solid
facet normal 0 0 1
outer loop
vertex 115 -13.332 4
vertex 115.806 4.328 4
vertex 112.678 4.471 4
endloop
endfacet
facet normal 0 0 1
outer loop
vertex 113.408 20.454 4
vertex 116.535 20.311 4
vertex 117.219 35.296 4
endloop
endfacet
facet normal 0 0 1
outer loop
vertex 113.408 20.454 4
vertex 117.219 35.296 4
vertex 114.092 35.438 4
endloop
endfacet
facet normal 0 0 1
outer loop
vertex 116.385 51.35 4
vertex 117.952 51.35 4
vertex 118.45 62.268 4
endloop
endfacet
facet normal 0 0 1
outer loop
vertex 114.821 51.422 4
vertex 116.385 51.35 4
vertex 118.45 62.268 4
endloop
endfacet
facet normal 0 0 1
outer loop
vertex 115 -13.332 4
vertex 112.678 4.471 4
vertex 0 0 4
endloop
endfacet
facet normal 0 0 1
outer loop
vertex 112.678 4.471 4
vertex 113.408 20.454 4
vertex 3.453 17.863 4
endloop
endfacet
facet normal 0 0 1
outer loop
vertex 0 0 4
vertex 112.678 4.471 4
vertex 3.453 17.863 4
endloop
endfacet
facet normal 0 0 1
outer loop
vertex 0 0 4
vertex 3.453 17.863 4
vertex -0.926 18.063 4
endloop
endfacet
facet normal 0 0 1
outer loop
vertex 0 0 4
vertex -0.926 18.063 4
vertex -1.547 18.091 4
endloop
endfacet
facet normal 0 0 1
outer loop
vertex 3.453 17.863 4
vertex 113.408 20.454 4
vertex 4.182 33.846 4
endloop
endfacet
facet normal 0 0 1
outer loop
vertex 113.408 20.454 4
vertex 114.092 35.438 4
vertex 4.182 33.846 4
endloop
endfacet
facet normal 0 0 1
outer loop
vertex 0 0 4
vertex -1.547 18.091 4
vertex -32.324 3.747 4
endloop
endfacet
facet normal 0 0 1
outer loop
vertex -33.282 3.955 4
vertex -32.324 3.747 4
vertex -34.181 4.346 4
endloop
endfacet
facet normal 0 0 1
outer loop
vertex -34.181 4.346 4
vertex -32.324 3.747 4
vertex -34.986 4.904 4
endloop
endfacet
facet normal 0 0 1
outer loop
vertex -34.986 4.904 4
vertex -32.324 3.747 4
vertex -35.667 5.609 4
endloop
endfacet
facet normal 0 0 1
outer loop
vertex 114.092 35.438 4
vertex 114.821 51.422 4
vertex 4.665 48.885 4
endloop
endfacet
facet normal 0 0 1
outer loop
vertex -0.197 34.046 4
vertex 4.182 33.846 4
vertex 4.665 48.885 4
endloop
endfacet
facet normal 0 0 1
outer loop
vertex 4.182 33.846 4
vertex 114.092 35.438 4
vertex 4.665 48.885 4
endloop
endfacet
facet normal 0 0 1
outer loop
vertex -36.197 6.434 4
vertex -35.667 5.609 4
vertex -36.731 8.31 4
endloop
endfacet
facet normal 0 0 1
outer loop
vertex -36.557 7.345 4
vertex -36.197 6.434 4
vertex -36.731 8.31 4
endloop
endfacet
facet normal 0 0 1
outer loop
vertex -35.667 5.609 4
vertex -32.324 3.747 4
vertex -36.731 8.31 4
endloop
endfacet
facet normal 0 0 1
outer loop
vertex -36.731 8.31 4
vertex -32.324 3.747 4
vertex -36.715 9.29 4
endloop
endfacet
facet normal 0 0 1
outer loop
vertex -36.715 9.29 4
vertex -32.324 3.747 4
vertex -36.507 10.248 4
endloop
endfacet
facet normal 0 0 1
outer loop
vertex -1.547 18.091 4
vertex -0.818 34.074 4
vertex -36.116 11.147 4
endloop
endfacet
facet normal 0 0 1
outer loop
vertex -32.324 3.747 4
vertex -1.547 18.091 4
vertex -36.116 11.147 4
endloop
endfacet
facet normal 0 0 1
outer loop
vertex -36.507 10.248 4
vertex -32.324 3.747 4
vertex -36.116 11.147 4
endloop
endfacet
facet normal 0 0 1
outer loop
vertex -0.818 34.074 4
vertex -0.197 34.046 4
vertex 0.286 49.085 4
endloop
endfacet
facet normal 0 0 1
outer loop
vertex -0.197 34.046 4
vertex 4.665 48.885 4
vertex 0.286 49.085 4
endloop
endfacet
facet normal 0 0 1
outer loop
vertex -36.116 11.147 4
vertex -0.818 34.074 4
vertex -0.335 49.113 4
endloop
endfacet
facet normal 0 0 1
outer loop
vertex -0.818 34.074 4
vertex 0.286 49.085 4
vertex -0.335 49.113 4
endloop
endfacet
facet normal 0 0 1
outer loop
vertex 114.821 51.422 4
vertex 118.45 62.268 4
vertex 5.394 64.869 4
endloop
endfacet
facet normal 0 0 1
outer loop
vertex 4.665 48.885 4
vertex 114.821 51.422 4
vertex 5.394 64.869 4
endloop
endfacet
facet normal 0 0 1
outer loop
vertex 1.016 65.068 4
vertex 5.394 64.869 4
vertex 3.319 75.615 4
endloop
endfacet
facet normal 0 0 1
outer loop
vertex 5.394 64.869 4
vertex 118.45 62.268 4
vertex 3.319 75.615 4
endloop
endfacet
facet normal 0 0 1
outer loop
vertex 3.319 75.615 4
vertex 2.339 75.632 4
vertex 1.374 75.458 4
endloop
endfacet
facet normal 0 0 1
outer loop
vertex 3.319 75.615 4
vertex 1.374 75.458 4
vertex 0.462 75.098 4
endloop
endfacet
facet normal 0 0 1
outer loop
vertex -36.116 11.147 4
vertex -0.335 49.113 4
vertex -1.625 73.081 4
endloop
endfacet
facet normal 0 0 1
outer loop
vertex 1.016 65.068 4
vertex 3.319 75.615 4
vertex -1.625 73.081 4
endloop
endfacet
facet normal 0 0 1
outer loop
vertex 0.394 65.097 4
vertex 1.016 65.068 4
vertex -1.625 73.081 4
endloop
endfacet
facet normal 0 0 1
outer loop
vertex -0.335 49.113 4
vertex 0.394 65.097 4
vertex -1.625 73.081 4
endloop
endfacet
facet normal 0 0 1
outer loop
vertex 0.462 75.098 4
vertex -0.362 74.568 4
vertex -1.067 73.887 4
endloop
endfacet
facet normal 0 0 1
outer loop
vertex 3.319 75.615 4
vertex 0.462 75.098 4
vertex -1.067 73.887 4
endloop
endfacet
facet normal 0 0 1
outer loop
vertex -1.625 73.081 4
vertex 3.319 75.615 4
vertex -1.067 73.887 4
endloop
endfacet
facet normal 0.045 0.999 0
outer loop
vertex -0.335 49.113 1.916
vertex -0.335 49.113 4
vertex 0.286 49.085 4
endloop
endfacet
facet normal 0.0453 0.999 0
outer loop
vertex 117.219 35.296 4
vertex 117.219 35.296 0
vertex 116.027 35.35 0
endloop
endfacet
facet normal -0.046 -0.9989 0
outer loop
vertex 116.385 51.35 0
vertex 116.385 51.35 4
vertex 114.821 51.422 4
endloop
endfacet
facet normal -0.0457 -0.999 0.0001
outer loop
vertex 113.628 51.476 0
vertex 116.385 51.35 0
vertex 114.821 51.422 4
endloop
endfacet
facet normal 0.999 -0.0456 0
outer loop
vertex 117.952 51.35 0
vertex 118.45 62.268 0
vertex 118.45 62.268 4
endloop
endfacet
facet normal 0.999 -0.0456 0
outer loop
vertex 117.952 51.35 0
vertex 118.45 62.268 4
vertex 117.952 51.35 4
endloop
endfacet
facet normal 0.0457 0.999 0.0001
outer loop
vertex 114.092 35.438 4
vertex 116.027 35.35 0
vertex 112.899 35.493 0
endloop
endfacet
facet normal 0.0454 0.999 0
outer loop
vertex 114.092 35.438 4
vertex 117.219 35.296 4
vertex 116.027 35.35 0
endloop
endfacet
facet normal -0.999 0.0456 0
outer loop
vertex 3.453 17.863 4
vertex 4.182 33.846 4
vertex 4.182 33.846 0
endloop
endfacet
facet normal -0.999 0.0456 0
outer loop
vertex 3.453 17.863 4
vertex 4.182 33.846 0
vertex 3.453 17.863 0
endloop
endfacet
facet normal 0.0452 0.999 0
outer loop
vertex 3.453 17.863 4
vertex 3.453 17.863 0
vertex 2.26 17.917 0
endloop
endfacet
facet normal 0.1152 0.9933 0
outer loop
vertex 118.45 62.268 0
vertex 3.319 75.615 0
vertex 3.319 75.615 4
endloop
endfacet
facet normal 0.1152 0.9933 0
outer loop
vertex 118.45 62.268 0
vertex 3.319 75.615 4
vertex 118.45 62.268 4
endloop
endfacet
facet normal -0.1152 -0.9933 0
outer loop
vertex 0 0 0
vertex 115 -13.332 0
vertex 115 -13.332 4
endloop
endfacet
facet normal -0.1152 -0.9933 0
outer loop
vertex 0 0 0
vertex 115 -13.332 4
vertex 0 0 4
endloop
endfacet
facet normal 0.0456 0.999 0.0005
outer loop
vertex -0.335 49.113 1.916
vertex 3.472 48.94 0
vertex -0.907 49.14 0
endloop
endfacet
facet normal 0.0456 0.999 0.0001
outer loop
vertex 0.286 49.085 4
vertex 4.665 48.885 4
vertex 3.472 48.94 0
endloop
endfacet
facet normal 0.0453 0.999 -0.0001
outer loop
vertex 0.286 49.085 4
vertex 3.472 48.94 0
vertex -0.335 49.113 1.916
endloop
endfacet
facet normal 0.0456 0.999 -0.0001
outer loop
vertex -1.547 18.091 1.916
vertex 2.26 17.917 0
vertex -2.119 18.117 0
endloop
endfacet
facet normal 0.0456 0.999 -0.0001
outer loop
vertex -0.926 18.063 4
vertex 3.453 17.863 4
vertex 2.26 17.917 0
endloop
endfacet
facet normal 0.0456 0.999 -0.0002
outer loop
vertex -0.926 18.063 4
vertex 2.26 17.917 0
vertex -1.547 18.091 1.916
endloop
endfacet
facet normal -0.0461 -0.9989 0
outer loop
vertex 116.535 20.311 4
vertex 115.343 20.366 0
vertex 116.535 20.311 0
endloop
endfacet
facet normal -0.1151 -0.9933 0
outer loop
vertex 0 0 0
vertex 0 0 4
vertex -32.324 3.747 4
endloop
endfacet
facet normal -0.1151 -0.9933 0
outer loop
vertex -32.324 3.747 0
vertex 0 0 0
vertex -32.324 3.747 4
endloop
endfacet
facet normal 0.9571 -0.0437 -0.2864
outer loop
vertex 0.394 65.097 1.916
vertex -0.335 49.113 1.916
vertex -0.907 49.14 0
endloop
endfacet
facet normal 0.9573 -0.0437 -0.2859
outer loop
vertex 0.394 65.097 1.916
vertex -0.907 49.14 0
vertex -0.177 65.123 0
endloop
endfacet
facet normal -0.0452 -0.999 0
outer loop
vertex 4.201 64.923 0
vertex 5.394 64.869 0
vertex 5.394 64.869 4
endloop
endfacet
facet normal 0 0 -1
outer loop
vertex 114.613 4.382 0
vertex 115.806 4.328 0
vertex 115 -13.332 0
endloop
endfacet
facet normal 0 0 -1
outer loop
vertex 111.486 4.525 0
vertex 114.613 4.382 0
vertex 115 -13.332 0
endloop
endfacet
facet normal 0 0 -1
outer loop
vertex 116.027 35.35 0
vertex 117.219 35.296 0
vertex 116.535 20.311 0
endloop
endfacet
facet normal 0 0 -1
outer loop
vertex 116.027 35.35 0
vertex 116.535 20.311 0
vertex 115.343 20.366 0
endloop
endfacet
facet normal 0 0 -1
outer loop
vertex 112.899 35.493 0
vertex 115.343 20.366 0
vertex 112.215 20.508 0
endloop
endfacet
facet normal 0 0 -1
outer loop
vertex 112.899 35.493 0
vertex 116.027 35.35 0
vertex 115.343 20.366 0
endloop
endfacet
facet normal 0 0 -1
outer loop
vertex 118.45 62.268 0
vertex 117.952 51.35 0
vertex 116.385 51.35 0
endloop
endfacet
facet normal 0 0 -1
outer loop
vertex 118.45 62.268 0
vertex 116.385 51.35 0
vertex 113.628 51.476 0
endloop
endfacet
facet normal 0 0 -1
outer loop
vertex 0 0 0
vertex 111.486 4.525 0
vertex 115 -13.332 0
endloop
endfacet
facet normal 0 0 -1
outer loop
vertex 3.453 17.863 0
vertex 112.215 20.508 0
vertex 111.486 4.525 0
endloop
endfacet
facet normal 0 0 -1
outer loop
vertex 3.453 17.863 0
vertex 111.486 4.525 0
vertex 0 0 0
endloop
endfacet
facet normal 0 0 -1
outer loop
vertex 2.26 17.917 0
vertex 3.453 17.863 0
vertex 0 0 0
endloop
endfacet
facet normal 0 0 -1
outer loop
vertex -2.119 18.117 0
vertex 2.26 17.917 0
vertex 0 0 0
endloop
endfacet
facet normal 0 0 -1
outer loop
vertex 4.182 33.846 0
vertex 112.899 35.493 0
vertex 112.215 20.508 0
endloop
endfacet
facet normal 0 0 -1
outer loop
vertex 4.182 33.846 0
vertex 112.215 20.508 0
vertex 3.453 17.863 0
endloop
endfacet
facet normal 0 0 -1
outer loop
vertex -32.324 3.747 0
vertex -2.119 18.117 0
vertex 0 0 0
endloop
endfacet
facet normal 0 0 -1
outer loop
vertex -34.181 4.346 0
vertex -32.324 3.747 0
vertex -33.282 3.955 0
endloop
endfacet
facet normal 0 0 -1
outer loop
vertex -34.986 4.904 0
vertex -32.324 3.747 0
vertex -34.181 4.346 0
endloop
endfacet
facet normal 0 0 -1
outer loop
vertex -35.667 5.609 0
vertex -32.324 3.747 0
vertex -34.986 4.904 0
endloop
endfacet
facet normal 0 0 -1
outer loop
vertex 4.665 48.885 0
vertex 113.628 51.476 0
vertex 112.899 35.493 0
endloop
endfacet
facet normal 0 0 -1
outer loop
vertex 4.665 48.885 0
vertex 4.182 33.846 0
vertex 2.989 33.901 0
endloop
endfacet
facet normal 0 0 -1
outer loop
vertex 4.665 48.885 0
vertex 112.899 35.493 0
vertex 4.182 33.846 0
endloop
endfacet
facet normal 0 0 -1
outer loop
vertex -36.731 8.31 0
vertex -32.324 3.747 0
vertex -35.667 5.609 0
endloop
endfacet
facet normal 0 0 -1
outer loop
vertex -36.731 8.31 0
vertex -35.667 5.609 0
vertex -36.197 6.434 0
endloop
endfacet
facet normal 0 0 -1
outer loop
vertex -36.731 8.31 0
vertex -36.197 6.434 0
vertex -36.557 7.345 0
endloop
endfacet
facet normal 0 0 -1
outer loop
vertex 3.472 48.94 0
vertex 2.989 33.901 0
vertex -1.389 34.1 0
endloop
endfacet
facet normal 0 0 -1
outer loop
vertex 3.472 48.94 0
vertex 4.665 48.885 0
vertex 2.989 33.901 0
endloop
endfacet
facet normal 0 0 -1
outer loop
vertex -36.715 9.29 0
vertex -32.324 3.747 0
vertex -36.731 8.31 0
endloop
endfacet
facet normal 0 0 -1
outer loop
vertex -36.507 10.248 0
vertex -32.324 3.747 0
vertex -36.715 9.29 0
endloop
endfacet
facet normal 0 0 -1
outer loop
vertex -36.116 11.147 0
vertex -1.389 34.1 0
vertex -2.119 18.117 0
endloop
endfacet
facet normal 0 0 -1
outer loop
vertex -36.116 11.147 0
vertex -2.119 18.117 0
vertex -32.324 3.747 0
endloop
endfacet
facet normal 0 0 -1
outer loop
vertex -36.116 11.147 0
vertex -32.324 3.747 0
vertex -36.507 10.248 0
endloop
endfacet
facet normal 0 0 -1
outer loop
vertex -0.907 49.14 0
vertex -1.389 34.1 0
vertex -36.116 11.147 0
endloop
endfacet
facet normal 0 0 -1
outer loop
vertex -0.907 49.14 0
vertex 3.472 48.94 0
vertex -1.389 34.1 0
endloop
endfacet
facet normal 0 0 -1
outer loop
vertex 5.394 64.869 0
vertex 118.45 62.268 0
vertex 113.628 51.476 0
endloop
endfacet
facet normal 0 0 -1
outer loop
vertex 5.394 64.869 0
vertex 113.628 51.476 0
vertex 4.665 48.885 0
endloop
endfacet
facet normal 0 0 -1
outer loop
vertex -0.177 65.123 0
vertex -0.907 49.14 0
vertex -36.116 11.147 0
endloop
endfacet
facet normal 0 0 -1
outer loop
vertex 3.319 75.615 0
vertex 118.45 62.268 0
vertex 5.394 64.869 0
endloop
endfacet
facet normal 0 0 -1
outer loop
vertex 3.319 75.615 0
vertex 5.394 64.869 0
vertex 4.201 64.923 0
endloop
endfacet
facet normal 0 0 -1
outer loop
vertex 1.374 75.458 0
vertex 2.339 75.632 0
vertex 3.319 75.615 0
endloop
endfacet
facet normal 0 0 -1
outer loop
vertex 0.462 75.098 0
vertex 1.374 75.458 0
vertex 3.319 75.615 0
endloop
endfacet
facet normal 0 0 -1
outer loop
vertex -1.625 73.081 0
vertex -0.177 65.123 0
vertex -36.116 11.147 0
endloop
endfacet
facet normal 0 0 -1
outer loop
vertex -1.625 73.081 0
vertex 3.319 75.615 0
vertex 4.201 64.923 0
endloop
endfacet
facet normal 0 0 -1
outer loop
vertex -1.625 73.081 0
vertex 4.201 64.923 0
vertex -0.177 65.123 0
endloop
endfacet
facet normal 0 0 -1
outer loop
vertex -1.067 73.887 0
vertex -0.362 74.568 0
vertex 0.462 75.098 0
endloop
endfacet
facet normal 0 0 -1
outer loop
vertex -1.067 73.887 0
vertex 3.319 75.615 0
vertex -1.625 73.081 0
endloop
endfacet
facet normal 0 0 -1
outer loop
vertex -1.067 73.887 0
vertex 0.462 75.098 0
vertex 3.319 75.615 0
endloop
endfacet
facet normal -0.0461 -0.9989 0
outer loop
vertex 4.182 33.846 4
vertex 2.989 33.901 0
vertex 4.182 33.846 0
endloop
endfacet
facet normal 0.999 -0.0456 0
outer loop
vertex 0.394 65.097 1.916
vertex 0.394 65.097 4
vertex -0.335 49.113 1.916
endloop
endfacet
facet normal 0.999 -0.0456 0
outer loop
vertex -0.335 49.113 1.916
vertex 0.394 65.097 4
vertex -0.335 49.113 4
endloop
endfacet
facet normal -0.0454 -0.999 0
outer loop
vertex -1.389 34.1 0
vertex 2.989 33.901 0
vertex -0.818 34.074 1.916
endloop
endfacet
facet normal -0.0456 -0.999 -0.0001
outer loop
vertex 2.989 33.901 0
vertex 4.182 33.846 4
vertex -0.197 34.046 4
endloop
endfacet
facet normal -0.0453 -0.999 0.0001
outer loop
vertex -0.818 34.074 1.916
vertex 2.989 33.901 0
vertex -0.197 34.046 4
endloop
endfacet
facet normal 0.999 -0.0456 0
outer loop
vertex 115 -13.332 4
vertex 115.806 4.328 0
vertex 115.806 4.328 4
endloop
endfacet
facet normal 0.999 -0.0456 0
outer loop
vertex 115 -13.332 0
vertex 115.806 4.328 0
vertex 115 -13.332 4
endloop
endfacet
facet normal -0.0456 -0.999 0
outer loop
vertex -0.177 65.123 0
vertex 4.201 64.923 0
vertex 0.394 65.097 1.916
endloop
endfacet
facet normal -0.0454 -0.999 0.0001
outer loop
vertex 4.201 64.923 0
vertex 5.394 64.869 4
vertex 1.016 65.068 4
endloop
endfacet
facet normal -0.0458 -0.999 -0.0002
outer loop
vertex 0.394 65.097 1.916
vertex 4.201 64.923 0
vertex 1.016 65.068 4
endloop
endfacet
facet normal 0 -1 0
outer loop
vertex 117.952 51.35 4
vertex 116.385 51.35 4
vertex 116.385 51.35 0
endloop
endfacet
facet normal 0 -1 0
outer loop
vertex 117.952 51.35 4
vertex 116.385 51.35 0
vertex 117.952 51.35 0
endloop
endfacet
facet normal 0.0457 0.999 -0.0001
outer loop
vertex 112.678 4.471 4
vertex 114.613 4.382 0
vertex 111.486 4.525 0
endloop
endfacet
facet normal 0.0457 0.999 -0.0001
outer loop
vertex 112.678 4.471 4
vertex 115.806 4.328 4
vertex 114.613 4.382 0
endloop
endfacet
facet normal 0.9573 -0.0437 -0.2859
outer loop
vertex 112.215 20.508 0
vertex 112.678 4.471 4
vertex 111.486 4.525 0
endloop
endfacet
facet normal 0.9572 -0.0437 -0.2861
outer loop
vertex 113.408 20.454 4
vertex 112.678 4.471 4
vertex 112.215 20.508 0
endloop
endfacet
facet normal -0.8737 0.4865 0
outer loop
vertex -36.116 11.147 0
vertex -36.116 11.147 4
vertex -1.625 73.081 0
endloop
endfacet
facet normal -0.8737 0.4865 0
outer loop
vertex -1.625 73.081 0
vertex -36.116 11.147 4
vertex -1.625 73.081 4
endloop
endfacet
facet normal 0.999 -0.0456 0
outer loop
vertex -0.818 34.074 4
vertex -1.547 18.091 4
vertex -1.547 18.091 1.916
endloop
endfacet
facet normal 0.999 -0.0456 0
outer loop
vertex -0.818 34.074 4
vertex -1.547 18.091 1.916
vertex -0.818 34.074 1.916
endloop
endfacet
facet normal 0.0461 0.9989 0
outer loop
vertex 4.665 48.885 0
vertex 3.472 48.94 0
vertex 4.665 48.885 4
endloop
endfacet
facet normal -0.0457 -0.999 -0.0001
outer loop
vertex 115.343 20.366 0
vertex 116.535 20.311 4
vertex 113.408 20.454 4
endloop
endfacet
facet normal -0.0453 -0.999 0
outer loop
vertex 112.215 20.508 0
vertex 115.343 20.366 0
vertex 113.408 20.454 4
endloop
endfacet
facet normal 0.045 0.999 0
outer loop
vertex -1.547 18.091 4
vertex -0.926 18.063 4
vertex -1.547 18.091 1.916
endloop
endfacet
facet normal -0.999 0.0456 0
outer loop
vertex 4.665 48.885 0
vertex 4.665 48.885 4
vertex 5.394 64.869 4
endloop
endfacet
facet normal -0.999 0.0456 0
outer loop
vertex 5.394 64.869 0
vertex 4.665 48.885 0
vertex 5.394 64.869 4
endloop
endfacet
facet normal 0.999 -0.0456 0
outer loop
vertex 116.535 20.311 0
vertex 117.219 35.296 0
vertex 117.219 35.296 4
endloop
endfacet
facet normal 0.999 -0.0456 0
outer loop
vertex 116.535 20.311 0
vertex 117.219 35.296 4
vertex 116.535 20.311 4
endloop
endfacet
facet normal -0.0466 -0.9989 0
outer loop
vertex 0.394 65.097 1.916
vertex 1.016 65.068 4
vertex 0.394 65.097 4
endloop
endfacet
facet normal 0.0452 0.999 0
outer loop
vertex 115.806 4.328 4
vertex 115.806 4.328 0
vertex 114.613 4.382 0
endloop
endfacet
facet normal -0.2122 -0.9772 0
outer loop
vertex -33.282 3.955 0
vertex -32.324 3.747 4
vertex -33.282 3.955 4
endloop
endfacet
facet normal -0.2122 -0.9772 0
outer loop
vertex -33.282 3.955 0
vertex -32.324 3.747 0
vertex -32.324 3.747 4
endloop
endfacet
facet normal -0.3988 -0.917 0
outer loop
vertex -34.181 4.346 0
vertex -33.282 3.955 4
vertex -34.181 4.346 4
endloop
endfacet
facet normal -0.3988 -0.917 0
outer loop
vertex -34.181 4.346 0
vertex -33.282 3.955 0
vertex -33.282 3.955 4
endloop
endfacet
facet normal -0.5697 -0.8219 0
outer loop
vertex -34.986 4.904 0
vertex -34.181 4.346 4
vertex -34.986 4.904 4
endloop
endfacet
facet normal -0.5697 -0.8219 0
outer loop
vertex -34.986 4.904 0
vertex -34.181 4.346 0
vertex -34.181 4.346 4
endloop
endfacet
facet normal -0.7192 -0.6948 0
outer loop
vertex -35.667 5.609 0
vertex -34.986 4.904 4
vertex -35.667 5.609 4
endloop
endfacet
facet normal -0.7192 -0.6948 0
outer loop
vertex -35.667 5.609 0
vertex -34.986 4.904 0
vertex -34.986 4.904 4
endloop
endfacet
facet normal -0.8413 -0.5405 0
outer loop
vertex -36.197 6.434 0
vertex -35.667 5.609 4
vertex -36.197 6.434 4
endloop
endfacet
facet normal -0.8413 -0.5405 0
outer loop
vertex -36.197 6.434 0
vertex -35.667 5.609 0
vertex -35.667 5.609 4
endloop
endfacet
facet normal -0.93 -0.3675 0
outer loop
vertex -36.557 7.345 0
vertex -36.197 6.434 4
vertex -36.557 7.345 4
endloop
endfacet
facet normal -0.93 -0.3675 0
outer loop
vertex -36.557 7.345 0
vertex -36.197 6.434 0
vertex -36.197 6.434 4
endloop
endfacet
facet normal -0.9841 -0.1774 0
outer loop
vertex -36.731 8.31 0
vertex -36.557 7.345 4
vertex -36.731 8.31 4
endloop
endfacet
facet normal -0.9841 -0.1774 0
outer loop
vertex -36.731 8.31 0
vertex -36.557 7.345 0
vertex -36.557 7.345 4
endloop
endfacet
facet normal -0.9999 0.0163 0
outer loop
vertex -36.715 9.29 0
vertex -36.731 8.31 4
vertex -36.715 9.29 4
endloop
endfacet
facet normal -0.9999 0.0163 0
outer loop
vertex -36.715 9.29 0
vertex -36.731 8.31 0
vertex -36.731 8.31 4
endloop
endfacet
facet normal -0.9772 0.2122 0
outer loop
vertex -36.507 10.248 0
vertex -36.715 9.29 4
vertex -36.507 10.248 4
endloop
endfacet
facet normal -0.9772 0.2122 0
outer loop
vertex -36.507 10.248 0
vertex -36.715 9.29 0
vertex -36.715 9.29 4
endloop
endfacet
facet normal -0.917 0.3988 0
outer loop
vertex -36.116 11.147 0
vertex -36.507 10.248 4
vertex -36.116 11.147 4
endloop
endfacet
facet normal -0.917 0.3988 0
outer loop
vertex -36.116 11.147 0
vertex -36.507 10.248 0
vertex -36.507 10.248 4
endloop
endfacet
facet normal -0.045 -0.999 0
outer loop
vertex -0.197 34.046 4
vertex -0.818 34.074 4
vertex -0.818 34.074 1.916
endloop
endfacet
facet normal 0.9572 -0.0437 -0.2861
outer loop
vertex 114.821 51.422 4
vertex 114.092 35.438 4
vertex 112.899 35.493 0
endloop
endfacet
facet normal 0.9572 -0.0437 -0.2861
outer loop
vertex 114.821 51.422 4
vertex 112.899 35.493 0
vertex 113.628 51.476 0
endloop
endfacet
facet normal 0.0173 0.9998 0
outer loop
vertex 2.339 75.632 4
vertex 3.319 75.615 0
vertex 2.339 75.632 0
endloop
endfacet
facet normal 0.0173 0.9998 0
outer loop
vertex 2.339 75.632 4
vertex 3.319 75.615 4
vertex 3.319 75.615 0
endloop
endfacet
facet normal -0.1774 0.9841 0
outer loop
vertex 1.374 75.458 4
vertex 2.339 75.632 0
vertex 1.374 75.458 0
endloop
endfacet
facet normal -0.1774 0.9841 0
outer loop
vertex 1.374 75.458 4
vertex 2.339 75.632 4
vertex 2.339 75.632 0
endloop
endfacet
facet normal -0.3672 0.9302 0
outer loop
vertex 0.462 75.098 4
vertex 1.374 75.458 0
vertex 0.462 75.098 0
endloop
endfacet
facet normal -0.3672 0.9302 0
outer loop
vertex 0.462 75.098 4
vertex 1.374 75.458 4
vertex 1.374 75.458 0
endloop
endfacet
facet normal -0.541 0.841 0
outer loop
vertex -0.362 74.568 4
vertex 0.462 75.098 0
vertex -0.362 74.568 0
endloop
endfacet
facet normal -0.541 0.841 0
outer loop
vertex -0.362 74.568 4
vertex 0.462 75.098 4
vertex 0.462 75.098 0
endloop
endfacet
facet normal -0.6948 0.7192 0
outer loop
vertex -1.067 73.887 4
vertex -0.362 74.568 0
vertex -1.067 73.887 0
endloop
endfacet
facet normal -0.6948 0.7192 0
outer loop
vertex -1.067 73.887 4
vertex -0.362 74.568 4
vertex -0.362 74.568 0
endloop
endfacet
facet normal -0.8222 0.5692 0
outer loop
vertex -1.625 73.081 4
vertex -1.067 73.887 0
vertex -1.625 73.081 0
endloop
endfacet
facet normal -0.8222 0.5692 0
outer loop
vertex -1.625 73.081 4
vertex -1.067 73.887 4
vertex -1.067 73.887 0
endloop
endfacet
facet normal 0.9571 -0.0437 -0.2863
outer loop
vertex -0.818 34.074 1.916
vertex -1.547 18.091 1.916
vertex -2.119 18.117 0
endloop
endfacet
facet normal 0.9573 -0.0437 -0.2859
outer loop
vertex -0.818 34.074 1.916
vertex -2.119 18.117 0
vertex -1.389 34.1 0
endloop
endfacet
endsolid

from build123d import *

# Parameters (mm, degrees)
RESSALTO_EXTRUS_O1_DEPTH = 4
RESSALTO_EXTRUS_O5_DEPTH = 4
ESBO_O15_W               = 16
ESBO_O15_H               = 4.2
ESBO_O15_H_2             = 3
CORTE_EXTRUS_O2_DEPTH    = 137.905868833
CORTE_EXTRUS_O3_DEPTH    = 141.792239382
FILETE1_R                = 5
CORTE_EXTRUS_O4_DEPTH    = 141.602820342


with BuildPart() as part:
    # Esboço1 → Ressalto-extrusão1 (new body)
    with BuildSketch(Plane.XY):
        Polygon((0, 0), (0, 76), (118.45022022, 62.267517703), (115, -13.332482297), align=None)
    extrude(amount=RESSALTO_EXTRUS_O1_DEPTH)

    # Esboço13 → Ressalto-extrusão5 (add)
    with BuildSketch(Plane.XY.offset(4)):
        Polygon((0, 0), (-39.756896509, 4.609201034), (0, 76), align=None)
    extrude(amount=-RESSALTO_EXTRUS_O5_DEPTH)

    # Esboço15 → Corte-extrusão2 (cut, through all)
    with BuildSketch(Plane(origin=(10.533319004, -0.48071786, 35.325049871), x_dir=(0.045590380198121984, 0.9989602180434368, 0), z_dir=(0.28572546626048706, -0.013039891282772654, 0.9582227920298917))):
        with Locations((57.047089405, 0.914508914)):
            Rectangle(ESBO_O15_W, ESBO_O15_H)
        with Locations((26.001686631, 0.719596914)):
            Rectangle(ESBO_O15_W, ESBO_O15_H)
        with Locations((48.602963636, -108.019389568)):
            Rectangle(ESBO_O15_W, ESBO_O15_H_2)
        with Locations((17.602963636, -108.019389568)):
            Rectangle(ESBO_O15_W, ESBO_O15_H_2)
    extrude(amount=-CORTE_EXTRUS_O2_DEPTH, mode=Mode.SUBTRACT)

    # Esboço16 → Corte-extrusão3 (cut, through all)
    with BuildSketch(Plane.XY.offset(4)):
        Polygon((116.384955754, 51.350322393), (121.395369813, 51.350322393), (120.655509671, 35.138769736), (115.655509671, 35.366958904), align=None)
        Polygon((114.971653968, 20.382555633), (118.971653968, 20.200004299), (118.242207885, 4.21664081), (114.242207885, 4.399192144), align=None)
    extrude(amount=-CORTE_EXTRUS_O3_DEPTH, mode=Mode.SUBTRACT)

    # Filete1
    filete1_edges = [part.edges().sort_by_distance(p)[0] for p in [
        (-39.756896509, 4.609201034, 2),
        (0, 76, 2),
    ]]
    fillet(filete1_edges, radius=FILETE1_R)

    # Esboço19 → Corte-extrusão4 (cut, through all)
    with BuildSketch(Plane.XY.offset(4)):
        Polygon((5.394142853, 64.868617599), (0.394142853, 65.096806767), (-0.33530323, 49.113443279), (4.66469677, 48.885254111), align=None)
        Polygon((4.181969533, 33.84622174), (3.45252345, 17.862858252), (-1.54747655, 18.091047419), (-0.818030467, 34.074410908), align=None)
    extrude(amount=-CORTE_EXTRUS_O4_DEPTH, mode=Mode.SUBTRACT)


solid = part.part
